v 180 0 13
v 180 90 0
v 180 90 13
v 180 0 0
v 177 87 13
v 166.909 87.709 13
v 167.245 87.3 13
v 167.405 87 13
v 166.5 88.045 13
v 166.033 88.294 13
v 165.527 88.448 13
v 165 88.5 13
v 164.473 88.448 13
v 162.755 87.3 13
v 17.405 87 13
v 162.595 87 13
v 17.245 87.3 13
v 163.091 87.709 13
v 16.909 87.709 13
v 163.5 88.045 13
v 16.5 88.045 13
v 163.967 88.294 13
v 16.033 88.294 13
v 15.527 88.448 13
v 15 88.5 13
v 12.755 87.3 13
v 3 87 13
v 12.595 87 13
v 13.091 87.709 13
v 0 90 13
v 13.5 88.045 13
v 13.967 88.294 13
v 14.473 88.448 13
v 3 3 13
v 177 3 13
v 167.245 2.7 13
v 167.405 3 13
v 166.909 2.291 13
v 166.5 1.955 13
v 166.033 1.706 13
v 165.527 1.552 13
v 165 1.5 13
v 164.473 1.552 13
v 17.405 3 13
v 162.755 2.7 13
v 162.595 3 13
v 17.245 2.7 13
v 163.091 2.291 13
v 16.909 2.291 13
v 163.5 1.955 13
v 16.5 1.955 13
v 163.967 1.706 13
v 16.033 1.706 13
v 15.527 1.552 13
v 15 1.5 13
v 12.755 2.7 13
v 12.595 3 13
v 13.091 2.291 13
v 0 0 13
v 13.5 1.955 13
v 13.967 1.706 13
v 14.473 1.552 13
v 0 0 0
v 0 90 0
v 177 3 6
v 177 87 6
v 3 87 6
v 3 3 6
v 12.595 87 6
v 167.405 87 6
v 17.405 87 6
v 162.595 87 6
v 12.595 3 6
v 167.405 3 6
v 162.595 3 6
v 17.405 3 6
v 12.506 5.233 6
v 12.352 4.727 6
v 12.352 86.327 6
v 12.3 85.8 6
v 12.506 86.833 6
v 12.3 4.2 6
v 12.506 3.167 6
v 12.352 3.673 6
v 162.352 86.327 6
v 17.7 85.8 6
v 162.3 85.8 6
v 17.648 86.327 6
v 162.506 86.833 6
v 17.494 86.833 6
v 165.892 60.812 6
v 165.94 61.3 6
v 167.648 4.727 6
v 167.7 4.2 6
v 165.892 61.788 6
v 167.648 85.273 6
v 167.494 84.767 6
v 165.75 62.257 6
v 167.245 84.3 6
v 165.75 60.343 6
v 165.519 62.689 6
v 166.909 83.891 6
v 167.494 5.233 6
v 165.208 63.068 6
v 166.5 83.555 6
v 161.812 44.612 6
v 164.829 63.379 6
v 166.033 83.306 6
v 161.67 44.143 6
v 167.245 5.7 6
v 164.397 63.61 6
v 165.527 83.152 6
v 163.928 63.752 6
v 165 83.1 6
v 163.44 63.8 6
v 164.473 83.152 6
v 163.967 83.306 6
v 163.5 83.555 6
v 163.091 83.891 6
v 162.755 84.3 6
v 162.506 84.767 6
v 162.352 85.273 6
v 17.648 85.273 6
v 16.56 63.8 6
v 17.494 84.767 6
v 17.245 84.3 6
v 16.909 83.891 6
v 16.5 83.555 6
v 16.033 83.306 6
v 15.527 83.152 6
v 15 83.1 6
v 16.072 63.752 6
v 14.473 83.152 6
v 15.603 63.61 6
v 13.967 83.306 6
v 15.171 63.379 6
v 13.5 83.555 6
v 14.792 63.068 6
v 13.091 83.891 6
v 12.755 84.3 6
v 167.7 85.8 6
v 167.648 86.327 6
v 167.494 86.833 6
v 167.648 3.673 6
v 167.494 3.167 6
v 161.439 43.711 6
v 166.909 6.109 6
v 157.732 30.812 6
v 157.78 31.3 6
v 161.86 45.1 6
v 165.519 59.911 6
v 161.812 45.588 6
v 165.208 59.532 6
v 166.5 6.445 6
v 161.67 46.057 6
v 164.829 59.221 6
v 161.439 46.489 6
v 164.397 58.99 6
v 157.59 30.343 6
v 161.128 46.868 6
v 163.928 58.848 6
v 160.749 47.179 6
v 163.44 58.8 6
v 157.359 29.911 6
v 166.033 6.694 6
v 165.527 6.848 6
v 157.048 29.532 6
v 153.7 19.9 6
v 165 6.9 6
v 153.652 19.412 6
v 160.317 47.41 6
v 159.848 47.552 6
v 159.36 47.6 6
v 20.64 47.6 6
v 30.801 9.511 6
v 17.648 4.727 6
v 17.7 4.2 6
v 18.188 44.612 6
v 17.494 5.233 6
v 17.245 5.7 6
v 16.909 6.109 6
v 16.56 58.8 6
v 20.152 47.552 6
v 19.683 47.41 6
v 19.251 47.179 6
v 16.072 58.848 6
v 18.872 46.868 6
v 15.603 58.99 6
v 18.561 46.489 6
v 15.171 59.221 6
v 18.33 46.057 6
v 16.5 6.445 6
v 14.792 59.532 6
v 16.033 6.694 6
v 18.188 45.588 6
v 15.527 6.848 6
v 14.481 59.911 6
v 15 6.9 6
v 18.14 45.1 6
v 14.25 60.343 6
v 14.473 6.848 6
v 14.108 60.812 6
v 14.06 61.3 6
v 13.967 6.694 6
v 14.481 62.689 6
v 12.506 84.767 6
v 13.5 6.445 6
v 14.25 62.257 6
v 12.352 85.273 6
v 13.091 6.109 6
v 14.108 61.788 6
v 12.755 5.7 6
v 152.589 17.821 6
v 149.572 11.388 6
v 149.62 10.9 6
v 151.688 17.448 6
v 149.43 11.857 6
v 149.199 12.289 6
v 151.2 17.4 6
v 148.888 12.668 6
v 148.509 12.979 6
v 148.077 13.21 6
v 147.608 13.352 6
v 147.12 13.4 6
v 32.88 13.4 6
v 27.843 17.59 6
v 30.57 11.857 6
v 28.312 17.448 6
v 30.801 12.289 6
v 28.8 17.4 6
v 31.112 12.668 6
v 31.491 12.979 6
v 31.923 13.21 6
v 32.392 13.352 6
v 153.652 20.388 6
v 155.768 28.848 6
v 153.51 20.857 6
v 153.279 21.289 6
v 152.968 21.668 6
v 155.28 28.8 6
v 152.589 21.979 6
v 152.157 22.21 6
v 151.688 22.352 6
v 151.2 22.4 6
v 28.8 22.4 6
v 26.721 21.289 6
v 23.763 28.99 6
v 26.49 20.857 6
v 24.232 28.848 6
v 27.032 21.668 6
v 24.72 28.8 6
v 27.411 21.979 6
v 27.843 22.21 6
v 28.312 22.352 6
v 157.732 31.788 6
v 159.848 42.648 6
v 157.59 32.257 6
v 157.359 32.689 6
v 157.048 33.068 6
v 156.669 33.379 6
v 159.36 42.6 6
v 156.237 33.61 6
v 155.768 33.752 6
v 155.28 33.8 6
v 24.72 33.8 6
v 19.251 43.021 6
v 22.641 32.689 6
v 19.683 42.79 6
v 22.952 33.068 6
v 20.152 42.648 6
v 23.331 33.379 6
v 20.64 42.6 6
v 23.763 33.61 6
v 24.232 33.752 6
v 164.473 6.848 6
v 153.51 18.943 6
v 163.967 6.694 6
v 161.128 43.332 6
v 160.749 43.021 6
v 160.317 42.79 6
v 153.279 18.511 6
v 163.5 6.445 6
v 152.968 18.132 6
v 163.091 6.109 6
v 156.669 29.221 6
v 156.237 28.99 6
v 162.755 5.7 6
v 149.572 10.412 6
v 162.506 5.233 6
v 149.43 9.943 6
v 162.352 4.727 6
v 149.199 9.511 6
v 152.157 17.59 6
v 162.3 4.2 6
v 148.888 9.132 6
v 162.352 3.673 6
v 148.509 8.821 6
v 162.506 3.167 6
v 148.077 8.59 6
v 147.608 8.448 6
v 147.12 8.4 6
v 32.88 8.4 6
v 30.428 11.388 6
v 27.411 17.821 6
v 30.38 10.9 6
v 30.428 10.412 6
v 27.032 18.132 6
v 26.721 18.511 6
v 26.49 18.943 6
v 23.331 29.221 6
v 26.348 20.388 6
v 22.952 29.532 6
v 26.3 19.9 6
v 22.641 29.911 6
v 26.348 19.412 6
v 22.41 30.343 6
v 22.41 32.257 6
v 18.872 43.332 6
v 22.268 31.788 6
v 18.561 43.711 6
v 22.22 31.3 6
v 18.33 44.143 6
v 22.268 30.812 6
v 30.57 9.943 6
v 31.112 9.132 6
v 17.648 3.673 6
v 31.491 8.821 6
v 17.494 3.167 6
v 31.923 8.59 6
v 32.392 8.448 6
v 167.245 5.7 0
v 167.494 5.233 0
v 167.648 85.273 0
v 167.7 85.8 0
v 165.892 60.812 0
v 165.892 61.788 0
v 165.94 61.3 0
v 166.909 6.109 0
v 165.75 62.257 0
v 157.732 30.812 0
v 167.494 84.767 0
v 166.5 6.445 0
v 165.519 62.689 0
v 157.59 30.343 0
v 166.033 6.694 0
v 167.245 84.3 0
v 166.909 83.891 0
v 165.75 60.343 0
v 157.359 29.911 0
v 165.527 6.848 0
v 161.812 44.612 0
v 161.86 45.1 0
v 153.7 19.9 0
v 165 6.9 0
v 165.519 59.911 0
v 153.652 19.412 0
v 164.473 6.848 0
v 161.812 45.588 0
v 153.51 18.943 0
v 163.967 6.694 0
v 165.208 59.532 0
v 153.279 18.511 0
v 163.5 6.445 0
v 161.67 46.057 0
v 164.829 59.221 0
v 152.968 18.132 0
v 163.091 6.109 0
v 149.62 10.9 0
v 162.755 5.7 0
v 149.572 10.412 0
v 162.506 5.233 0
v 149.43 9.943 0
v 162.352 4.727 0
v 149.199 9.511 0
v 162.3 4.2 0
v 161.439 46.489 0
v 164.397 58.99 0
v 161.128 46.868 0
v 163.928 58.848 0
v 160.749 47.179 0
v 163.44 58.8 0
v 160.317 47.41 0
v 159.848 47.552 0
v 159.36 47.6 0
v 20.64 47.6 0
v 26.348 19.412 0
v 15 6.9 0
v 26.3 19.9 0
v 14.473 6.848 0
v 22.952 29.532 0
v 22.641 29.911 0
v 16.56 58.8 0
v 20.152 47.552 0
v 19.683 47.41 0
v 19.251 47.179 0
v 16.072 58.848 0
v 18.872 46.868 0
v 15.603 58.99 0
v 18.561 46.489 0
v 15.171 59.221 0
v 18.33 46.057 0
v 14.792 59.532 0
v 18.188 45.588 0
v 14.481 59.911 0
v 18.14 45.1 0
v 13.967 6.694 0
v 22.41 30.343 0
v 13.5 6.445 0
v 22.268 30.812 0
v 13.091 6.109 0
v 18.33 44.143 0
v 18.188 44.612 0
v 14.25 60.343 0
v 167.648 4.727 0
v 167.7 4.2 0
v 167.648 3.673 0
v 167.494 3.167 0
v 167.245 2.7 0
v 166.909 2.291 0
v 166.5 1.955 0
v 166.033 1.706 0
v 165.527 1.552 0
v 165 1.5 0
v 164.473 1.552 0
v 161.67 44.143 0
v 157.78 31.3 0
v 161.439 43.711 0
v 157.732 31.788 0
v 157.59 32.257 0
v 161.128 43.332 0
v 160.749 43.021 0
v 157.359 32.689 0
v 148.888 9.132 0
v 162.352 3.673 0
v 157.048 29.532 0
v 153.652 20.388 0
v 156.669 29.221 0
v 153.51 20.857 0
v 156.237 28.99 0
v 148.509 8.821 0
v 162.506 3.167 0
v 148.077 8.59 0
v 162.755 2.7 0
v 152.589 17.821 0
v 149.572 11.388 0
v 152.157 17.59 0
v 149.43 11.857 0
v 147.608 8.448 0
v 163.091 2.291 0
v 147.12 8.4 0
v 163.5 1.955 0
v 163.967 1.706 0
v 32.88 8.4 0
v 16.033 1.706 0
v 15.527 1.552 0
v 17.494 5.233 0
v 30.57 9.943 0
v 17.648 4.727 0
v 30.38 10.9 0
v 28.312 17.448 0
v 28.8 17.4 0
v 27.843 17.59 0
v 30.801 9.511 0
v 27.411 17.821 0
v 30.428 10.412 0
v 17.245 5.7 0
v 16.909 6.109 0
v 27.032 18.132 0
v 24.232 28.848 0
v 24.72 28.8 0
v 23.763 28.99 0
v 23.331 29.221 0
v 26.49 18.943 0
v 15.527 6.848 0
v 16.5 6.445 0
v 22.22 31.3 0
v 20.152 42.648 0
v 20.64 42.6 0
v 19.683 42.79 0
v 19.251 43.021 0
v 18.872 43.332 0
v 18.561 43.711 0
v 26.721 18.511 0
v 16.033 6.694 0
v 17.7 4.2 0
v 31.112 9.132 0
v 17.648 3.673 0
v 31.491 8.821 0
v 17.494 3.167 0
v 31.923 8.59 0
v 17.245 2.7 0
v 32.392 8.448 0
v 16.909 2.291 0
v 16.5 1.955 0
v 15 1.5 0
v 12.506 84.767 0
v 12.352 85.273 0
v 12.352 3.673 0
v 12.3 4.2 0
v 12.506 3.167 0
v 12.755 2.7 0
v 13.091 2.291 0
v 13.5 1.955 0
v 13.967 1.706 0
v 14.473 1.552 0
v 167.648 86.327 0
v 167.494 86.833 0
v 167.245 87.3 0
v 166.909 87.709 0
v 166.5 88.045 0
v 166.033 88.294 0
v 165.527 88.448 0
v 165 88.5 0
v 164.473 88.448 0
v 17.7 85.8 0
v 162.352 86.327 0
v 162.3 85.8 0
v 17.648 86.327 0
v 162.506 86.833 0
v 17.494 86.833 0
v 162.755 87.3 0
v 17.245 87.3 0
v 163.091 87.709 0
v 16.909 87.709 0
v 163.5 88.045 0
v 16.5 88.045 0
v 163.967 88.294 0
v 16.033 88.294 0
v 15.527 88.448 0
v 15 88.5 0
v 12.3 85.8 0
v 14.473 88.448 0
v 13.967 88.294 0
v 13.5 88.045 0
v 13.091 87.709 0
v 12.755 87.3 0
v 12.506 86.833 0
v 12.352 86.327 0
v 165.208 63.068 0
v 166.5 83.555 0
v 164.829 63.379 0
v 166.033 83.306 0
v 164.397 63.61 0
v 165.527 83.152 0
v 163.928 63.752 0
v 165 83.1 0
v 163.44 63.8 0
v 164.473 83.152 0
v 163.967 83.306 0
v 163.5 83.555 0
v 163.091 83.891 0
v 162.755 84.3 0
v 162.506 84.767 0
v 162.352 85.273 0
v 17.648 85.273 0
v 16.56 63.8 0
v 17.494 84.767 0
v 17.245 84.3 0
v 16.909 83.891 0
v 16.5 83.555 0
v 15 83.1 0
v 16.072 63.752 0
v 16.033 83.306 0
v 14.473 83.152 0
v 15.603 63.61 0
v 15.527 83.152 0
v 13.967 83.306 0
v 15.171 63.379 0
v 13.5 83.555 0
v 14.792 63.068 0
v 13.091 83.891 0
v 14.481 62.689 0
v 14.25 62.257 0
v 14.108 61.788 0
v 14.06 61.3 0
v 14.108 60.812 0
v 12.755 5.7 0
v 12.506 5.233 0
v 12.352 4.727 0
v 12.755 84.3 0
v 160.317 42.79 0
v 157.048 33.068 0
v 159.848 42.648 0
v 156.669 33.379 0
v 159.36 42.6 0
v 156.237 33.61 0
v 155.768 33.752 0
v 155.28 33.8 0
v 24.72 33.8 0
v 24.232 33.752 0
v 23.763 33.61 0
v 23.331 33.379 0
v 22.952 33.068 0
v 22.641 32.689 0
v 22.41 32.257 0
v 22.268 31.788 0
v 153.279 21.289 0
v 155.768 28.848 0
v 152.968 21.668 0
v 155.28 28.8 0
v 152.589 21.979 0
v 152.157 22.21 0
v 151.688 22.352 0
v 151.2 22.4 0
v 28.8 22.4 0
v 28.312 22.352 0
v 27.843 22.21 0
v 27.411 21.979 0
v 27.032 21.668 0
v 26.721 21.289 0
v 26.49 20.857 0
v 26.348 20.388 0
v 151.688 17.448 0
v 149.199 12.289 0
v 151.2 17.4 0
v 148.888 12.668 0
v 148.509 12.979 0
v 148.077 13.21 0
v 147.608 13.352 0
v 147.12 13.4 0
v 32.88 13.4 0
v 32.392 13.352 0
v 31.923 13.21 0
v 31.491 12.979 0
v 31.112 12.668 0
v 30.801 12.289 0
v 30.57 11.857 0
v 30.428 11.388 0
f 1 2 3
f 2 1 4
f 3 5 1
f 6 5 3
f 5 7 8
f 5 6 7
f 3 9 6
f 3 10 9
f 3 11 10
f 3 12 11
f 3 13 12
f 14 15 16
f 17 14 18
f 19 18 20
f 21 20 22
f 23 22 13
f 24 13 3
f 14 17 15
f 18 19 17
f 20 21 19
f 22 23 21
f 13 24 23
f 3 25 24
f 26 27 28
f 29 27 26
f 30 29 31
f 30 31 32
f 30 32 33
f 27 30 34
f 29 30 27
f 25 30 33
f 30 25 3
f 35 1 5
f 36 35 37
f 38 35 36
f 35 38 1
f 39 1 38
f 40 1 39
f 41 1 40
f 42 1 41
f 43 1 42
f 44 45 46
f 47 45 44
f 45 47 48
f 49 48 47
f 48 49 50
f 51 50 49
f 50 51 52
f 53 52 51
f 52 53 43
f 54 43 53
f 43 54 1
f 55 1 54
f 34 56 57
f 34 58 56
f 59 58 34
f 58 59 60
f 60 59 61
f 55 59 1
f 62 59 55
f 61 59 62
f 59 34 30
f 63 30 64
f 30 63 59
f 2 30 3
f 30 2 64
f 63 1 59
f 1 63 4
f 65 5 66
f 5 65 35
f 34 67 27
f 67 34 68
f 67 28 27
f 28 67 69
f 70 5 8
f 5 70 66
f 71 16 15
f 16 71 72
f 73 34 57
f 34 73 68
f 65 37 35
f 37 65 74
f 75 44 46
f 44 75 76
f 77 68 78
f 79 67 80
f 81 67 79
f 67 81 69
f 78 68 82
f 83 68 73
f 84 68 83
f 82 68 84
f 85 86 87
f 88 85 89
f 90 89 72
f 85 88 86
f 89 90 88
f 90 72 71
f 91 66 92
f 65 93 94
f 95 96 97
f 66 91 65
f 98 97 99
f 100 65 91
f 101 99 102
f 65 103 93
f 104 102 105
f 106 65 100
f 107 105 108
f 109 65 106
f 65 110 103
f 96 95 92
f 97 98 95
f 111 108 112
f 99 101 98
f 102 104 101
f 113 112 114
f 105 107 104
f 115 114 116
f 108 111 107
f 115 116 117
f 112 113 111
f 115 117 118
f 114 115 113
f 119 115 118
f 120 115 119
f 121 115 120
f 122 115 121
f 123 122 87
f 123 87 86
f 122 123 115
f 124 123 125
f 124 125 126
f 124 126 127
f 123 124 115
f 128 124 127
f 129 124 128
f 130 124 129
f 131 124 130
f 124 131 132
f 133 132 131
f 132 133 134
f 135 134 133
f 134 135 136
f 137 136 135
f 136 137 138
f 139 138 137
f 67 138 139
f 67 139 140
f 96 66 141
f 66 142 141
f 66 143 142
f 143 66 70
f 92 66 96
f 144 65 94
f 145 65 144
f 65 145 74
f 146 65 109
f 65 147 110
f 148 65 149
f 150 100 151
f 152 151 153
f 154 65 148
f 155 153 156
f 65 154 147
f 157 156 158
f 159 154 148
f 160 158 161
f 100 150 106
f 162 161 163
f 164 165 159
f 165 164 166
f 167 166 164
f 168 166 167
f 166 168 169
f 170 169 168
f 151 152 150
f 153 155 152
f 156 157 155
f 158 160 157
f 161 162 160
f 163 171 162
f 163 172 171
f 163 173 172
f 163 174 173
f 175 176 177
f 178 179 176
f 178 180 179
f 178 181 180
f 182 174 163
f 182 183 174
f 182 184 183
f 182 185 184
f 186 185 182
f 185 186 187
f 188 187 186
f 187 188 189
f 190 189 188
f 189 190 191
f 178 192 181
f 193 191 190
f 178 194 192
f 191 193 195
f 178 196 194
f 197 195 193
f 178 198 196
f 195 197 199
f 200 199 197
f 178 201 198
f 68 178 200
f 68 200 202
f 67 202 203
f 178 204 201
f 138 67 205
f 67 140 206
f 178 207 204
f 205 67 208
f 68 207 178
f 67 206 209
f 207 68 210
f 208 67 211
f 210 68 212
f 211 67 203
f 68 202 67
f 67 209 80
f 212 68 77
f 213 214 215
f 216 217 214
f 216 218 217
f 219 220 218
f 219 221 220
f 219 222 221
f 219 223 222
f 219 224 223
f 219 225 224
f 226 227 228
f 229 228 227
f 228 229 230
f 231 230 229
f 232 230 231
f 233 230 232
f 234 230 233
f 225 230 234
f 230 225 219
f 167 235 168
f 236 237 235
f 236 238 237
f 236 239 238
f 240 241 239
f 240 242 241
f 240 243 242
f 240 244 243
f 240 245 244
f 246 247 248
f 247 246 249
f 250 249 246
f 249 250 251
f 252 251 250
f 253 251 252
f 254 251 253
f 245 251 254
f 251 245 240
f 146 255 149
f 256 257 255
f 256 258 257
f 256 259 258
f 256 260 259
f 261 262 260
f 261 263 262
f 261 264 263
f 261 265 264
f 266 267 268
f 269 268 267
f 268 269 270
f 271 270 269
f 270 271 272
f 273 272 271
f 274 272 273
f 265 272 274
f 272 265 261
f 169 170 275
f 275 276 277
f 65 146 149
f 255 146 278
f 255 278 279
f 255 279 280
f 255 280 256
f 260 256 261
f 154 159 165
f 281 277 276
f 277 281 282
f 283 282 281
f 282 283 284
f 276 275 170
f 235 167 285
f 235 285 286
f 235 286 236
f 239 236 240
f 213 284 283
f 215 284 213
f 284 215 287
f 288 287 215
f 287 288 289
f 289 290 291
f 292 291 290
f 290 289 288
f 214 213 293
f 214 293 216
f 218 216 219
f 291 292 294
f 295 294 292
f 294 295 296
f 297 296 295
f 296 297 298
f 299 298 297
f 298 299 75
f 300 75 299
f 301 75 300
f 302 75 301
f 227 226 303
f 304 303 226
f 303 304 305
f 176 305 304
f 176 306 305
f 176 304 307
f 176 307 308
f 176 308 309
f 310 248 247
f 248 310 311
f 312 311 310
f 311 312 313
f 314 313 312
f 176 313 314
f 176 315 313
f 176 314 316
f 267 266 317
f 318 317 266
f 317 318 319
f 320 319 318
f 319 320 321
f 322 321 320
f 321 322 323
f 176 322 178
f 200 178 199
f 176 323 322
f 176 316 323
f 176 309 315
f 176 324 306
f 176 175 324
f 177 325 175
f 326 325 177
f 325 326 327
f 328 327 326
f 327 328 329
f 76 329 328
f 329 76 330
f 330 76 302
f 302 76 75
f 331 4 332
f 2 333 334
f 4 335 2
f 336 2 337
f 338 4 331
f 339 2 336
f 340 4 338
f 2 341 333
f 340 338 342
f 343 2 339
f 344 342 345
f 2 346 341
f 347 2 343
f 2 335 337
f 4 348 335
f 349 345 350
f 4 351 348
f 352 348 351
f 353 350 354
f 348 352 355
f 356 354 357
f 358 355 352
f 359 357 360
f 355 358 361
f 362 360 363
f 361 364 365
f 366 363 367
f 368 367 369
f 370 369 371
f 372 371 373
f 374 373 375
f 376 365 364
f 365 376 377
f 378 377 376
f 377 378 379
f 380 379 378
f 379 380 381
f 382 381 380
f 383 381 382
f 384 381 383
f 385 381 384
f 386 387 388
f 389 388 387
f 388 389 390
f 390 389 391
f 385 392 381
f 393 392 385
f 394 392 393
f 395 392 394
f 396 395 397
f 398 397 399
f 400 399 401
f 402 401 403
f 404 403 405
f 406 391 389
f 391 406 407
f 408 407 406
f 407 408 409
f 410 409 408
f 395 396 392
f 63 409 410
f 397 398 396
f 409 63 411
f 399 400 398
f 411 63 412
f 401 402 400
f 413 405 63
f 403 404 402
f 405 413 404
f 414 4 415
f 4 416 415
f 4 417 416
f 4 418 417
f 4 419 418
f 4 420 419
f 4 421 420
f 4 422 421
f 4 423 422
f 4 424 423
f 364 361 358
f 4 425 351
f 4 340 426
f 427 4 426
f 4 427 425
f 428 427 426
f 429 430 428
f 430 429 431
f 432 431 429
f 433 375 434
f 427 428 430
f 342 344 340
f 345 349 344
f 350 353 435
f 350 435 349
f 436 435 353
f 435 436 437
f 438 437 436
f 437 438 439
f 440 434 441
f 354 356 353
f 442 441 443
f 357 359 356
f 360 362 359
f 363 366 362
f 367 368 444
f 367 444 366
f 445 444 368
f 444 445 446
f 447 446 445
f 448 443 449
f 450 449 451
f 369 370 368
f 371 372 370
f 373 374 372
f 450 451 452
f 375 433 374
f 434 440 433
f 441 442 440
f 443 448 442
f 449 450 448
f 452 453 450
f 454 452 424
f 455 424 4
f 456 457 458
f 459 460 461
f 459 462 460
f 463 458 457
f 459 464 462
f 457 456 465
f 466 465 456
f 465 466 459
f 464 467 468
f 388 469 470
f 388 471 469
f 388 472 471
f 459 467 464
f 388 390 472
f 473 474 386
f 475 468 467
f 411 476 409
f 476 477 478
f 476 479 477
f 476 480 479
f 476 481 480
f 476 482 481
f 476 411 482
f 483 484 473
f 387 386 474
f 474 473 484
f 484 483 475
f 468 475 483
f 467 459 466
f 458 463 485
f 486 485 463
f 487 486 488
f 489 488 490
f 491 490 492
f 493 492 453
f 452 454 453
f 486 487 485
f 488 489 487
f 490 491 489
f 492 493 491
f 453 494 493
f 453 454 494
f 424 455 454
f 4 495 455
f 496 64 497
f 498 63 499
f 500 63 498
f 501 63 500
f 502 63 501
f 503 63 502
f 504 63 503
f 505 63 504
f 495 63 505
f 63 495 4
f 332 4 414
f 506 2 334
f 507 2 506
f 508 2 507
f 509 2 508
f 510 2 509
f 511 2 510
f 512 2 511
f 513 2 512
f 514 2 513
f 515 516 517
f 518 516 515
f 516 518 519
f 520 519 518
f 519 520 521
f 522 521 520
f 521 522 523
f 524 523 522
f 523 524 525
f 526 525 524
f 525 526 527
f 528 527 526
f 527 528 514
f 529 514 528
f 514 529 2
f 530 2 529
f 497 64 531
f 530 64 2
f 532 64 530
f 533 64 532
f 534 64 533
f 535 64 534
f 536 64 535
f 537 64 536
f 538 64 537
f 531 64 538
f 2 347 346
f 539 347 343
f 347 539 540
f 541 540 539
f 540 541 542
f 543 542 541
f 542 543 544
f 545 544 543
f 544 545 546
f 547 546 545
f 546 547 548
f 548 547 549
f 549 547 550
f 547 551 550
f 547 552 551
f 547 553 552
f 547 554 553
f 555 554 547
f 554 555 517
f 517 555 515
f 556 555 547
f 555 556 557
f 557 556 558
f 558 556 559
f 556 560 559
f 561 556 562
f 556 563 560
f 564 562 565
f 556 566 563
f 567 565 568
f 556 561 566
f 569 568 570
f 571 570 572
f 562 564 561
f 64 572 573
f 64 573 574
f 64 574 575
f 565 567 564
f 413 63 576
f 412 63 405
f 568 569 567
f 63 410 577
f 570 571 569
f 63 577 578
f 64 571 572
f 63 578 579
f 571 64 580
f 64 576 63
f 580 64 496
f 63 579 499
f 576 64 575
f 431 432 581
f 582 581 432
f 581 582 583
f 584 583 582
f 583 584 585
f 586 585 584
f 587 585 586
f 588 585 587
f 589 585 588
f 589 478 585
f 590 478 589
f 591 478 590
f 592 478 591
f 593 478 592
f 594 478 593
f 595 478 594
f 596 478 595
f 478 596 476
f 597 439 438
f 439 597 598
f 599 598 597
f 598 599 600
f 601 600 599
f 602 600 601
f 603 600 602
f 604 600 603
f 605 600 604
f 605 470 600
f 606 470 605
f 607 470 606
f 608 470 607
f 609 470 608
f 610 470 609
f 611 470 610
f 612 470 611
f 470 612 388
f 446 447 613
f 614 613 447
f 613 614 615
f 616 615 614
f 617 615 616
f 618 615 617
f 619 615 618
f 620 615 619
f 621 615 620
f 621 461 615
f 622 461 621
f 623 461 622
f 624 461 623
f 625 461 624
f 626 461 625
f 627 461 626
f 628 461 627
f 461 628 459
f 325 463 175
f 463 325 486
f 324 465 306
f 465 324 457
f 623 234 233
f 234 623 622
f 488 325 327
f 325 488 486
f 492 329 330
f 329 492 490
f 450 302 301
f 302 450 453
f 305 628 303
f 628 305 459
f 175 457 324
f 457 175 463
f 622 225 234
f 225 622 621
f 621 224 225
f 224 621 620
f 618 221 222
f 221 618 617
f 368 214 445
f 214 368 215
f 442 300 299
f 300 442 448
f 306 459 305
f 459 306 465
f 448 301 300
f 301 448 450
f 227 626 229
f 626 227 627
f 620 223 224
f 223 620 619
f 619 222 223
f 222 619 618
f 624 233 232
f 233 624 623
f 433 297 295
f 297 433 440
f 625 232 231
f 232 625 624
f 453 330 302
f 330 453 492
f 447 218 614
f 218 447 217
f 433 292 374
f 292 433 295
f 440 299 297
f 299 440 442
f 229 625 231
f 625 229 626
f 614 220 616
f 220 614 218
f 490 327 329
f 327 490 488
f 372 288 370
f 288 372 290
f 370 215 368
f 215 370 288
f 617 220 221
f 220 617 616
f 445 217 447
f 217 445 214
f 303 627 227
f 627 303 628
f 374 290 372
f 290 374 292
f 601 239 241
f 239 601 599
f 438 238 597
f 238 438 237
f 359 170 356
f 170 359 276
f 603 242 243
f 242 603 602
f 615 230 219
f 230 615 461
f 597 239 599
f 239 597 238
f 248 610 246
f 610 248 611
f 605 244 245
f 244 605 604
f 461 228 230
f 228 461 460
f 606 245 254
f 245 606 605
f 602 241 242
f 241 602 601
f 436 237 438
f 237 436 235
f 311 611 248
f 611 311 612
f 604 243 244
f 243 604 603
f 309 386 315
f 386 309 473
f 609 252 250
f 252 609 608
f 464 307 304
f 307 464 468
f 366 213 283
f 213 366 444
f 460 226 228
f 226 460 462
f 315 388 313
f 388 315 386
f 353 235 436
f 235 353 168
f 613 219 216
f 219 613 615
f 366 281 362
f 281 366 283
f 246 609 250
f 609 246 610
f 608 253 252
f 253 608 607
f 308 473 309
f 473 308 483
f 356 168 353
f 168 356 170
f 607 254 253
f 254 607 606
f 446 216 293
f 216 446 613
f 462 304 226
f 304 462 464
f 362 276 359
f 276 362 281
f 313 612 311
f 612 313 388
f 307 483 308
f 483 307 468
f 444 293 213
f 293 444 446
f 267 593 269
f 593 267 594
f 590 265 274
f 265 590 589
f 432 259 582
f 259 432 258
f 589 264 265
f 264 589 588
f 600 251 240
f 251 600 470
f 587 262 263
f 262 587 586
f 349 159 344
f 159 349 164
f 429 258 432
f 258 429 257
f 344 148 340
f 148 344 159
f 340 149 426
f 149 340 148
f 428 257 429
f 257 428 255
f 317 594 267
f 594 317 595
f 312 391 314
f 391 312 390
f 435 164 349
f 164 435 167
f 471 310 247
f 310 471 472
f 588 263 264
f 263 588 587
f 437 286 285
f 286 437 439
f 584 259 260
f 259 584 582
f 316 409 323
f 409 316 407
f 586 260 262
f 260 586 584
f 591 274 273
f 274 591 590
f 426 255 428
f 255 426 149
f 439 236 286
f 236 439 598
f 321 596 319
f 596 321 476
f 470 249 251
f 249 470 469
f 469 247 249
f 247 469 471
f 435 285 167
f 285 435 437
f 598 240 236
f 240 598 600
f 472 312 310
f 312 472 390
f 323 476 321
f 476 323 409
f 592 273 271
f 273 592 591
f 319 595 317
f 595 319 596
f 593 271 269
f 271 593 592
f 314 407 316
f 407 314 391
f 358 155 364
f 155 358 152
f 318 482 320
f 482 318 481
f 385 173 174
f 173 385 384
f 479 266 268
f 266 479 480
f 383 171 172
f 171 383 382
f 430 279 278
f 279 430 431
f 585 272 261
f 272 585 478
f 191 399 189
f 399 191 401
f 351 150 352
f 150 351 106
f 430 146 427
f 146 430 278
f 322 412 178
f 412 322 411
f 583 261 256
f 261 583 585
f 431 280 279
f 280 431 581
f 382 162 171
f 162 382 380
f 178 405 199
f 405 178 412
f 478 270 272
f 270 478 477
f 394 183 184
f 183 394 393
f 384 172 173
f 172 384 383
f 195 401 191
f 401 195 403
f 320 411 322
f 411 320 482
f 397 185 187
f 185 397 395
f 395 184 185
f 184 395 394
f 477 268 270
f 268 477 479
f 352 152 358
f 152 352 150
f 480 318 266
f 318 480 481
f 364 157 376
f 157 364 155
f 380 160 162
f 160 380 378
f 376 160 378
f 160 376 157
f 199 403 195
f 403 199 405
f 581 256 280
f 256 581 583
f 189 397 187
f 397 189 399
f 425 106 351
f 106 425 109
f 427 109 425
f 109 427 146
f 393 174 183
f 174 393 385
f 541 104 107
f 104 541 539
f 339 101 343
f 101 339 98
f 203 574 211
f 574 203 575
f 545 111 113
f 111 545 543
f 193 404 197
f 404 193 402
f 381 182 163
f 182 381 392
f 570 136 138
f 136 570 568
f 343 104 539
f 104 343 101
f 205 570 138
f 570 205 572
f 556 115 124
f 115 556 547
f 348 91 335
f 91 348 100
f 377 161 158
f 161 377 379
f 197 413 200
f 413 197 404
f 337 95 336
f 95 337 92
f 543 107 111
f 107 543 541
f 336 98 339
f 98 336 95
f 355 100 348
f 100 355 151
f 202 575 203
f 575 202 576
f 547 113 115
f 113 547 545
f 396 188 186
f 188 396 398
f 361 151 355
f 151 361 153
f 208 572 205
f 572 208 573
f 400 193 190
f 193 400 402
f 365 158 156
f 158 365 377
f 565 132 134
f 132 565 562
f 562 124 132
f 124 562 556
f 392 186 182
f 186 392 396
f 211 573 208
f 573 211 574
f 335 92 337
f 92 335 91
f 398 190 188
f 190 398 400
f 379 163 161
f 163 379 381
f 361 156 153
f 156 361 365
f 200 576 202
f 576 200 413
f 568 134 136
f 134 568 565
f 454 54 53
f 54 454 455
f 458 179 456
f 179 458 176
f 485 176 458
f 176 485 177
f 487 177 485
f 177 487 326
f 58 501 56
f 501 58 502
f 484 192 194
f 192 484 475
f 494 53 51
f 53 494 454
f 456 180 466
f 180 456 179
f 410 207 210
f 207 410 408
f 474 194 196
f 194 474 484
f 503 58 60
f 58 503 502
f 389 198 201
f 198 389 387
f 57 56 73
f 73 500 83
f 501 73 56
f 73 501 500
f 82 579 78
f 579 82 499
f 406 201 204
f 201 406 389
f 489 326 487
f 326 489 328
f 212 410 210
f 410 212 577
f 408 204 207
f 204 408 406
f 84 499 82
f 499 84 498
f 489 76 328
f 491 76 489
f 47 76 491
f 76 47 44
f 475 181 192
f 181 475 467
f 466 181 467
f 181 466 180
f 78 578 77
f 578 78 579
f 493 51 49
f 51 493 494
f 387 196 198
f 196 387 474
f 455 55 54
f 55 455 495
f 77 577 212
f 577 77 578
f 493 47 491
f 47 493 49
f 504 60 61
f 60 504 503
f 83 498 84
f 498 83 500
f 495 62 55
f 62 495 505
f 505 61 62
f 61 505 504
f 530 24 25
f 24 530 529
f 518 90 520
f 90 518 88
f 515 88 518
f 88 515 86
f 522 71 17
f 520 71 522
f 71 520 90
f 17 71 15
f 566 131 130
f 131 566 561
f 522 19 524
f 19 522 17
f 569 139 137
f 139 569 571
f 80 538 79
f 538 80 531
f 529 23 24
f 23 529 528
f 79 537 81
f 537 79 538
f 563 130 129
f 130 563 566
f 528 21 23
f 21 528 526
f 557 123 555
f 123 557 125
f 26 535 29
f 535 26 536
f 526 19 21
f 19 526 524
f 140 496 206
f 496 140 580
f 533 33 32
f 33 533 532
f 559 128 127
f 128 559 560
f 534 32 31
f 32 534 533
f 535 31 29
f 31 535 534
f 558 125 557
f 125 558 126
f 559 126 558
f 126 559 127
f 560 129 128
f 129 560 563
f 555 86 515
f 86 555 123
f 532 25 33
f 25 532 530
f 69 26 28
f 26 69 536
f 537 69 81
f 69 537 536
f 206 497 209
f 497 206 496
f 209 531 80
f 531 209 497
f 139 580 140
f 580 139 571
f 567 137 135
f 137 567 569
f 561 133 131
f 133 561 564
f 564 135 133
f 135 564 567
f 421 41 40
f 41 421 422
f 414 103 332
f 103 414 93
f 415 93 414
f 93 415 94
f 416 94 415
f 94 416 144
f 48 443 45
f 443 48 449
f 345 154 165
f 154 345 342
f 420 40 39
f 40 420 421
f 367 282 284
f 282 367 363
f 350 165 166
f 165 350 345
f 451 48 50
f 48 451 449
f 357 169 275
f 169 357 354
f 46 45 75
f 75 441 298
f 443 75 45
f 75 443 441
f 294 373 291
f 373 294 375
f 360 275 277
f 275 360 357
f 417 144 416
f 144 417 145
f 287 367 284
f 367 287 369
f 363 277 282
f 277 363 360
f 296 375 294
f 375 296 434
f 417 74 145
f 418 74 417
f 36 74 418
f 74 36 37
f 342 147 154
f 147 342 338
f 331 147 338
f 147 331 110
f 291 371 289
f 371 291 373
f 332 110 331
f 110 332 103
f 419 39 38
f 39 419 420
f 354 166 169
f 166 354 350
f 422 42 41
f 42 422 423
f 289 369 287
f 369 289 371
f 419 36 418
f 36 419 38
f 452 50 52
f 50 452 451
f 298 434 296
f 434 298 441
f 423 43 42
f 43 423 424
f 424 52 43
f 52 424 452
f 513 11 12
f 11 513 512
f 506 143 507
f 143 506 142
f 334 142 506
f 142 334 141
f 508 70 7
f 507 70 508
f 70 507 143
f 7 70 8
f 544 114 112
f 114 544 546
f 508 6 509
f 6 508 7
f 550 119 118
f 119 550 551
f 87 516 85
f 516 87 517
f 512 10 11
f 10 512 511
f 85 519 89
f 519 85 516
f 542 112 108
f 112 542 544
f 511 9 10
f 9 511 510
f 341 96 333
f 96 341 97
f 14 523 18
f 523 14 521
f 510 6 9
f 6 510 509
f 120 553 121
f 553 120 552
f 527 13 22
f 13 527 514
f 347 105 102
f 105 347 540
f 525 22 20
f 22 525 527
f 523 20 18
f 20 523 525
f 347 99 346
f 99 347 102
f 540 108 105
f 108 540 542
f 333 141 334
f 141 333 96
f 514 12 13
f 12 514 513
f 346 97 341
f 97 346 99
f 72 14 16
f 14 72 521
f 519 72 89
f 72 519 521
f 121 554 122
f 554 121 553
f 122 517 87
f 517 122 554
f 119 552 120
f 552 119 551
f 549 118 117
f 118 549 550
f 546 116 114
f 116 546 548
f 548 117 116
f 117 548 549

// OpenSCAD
$fn = 32;

// ----------------------------------------------------------------------
// Slotted panel: 180 x 90 mm, 5 рядов of slots
// ----------------------------------------------------------------------

// --- parameters (mm) ---
panel_w = 180;            // panel width
panel_d = 90;             // panel depth
thick = 6;                // panel thickness
slot_w = 5;               // slot width
pitch0 = 9;               // first row pitch
pitch_step = 2.4;         // pitch increase per row
margin = 8.4;             // margin around the slot field
rows = 5;                 // number of slot rows
mount_d = 5.4;            // mounting holes
mount_x = 75;             // mounting hole offset
rim_h = 13;               // rim height
rim_t = 3;                // rim wall thickness

difference() {
  union() {
    cube([panel_w, panel_d, thick]);
    translate([0, 0, thick - 1]) difference() {
      cube([panel_w, panel_d, rim_h - thick + 1]);
      translate([rim_t, rim_t, -2.5]) cube([panel_w - 2 * rim_t, panel_d - 2 * rim_t, rim_h - thick + 6]);
    }
  }
  /* slot rows: stadium shaped cutters, 2.5 mm clear of both faces */
  /* row 0: pitch 9, length 114.24 */
  hull() {
    translate([32.88, 10.9, -2.5]) cylinder(h = thick + 5, d = slot_w);
    translate([147.12, 10.9, -2.5]) cylinder(h = thick + 5, d = slot_w);
  }
  /* row 1: pitch 11.4, length 122.4 */
  hull() {
    translate([28.8, 19.9, -2.5]) cylinder(h = thick + 5, d = slot_w);
    translate([151.2, 19.9, -2.5]) cylinder(h = thick + 5, d = slot_w);
  }
  /* row 2: pitch 13.8, length 130.56 */
  hull() {
    translate([24.72, 31.3, -2.5]) cylinder(h = thick + 5, d = slot_w);
    translate([155.28, 31.3, -2.5]) cylinder(h = thick + 5, d = slot_w);
  }
  /* row 3: pitch 16.2, length 138.72 */
  hull() {
    translate([20.64, 45.1, -2.5]) cylinder(h = thick + 5, d = slot_w);
    translate([159.36, 45.1, -2.5]) cylinder(h = thick + 5, d = slot_w);
  }
  /* row 4: pitch 18.6, length 146.88 */
  hull() {
    translate([16.56, 61.3, -2.5]) cylinder(h = thick + 5, d = slot_w);
    translate([163.44, 61.3, -2.5]) cylinder(h = thick + 5, d = slot_w);
  }
  translate([15, 4.2, -2.5]) cylinder(h = 18, d = mount_d);
  translate([15, 85.8, -2.5]) cylinder(h = 18, d = mount_d);
  translate([165, 4.2, -2.5]) cylinder(h = 18, d = mount_d);
  translate([165, 85.8, -2.5]) cylinder(h = 18, d = mount_d);
}
